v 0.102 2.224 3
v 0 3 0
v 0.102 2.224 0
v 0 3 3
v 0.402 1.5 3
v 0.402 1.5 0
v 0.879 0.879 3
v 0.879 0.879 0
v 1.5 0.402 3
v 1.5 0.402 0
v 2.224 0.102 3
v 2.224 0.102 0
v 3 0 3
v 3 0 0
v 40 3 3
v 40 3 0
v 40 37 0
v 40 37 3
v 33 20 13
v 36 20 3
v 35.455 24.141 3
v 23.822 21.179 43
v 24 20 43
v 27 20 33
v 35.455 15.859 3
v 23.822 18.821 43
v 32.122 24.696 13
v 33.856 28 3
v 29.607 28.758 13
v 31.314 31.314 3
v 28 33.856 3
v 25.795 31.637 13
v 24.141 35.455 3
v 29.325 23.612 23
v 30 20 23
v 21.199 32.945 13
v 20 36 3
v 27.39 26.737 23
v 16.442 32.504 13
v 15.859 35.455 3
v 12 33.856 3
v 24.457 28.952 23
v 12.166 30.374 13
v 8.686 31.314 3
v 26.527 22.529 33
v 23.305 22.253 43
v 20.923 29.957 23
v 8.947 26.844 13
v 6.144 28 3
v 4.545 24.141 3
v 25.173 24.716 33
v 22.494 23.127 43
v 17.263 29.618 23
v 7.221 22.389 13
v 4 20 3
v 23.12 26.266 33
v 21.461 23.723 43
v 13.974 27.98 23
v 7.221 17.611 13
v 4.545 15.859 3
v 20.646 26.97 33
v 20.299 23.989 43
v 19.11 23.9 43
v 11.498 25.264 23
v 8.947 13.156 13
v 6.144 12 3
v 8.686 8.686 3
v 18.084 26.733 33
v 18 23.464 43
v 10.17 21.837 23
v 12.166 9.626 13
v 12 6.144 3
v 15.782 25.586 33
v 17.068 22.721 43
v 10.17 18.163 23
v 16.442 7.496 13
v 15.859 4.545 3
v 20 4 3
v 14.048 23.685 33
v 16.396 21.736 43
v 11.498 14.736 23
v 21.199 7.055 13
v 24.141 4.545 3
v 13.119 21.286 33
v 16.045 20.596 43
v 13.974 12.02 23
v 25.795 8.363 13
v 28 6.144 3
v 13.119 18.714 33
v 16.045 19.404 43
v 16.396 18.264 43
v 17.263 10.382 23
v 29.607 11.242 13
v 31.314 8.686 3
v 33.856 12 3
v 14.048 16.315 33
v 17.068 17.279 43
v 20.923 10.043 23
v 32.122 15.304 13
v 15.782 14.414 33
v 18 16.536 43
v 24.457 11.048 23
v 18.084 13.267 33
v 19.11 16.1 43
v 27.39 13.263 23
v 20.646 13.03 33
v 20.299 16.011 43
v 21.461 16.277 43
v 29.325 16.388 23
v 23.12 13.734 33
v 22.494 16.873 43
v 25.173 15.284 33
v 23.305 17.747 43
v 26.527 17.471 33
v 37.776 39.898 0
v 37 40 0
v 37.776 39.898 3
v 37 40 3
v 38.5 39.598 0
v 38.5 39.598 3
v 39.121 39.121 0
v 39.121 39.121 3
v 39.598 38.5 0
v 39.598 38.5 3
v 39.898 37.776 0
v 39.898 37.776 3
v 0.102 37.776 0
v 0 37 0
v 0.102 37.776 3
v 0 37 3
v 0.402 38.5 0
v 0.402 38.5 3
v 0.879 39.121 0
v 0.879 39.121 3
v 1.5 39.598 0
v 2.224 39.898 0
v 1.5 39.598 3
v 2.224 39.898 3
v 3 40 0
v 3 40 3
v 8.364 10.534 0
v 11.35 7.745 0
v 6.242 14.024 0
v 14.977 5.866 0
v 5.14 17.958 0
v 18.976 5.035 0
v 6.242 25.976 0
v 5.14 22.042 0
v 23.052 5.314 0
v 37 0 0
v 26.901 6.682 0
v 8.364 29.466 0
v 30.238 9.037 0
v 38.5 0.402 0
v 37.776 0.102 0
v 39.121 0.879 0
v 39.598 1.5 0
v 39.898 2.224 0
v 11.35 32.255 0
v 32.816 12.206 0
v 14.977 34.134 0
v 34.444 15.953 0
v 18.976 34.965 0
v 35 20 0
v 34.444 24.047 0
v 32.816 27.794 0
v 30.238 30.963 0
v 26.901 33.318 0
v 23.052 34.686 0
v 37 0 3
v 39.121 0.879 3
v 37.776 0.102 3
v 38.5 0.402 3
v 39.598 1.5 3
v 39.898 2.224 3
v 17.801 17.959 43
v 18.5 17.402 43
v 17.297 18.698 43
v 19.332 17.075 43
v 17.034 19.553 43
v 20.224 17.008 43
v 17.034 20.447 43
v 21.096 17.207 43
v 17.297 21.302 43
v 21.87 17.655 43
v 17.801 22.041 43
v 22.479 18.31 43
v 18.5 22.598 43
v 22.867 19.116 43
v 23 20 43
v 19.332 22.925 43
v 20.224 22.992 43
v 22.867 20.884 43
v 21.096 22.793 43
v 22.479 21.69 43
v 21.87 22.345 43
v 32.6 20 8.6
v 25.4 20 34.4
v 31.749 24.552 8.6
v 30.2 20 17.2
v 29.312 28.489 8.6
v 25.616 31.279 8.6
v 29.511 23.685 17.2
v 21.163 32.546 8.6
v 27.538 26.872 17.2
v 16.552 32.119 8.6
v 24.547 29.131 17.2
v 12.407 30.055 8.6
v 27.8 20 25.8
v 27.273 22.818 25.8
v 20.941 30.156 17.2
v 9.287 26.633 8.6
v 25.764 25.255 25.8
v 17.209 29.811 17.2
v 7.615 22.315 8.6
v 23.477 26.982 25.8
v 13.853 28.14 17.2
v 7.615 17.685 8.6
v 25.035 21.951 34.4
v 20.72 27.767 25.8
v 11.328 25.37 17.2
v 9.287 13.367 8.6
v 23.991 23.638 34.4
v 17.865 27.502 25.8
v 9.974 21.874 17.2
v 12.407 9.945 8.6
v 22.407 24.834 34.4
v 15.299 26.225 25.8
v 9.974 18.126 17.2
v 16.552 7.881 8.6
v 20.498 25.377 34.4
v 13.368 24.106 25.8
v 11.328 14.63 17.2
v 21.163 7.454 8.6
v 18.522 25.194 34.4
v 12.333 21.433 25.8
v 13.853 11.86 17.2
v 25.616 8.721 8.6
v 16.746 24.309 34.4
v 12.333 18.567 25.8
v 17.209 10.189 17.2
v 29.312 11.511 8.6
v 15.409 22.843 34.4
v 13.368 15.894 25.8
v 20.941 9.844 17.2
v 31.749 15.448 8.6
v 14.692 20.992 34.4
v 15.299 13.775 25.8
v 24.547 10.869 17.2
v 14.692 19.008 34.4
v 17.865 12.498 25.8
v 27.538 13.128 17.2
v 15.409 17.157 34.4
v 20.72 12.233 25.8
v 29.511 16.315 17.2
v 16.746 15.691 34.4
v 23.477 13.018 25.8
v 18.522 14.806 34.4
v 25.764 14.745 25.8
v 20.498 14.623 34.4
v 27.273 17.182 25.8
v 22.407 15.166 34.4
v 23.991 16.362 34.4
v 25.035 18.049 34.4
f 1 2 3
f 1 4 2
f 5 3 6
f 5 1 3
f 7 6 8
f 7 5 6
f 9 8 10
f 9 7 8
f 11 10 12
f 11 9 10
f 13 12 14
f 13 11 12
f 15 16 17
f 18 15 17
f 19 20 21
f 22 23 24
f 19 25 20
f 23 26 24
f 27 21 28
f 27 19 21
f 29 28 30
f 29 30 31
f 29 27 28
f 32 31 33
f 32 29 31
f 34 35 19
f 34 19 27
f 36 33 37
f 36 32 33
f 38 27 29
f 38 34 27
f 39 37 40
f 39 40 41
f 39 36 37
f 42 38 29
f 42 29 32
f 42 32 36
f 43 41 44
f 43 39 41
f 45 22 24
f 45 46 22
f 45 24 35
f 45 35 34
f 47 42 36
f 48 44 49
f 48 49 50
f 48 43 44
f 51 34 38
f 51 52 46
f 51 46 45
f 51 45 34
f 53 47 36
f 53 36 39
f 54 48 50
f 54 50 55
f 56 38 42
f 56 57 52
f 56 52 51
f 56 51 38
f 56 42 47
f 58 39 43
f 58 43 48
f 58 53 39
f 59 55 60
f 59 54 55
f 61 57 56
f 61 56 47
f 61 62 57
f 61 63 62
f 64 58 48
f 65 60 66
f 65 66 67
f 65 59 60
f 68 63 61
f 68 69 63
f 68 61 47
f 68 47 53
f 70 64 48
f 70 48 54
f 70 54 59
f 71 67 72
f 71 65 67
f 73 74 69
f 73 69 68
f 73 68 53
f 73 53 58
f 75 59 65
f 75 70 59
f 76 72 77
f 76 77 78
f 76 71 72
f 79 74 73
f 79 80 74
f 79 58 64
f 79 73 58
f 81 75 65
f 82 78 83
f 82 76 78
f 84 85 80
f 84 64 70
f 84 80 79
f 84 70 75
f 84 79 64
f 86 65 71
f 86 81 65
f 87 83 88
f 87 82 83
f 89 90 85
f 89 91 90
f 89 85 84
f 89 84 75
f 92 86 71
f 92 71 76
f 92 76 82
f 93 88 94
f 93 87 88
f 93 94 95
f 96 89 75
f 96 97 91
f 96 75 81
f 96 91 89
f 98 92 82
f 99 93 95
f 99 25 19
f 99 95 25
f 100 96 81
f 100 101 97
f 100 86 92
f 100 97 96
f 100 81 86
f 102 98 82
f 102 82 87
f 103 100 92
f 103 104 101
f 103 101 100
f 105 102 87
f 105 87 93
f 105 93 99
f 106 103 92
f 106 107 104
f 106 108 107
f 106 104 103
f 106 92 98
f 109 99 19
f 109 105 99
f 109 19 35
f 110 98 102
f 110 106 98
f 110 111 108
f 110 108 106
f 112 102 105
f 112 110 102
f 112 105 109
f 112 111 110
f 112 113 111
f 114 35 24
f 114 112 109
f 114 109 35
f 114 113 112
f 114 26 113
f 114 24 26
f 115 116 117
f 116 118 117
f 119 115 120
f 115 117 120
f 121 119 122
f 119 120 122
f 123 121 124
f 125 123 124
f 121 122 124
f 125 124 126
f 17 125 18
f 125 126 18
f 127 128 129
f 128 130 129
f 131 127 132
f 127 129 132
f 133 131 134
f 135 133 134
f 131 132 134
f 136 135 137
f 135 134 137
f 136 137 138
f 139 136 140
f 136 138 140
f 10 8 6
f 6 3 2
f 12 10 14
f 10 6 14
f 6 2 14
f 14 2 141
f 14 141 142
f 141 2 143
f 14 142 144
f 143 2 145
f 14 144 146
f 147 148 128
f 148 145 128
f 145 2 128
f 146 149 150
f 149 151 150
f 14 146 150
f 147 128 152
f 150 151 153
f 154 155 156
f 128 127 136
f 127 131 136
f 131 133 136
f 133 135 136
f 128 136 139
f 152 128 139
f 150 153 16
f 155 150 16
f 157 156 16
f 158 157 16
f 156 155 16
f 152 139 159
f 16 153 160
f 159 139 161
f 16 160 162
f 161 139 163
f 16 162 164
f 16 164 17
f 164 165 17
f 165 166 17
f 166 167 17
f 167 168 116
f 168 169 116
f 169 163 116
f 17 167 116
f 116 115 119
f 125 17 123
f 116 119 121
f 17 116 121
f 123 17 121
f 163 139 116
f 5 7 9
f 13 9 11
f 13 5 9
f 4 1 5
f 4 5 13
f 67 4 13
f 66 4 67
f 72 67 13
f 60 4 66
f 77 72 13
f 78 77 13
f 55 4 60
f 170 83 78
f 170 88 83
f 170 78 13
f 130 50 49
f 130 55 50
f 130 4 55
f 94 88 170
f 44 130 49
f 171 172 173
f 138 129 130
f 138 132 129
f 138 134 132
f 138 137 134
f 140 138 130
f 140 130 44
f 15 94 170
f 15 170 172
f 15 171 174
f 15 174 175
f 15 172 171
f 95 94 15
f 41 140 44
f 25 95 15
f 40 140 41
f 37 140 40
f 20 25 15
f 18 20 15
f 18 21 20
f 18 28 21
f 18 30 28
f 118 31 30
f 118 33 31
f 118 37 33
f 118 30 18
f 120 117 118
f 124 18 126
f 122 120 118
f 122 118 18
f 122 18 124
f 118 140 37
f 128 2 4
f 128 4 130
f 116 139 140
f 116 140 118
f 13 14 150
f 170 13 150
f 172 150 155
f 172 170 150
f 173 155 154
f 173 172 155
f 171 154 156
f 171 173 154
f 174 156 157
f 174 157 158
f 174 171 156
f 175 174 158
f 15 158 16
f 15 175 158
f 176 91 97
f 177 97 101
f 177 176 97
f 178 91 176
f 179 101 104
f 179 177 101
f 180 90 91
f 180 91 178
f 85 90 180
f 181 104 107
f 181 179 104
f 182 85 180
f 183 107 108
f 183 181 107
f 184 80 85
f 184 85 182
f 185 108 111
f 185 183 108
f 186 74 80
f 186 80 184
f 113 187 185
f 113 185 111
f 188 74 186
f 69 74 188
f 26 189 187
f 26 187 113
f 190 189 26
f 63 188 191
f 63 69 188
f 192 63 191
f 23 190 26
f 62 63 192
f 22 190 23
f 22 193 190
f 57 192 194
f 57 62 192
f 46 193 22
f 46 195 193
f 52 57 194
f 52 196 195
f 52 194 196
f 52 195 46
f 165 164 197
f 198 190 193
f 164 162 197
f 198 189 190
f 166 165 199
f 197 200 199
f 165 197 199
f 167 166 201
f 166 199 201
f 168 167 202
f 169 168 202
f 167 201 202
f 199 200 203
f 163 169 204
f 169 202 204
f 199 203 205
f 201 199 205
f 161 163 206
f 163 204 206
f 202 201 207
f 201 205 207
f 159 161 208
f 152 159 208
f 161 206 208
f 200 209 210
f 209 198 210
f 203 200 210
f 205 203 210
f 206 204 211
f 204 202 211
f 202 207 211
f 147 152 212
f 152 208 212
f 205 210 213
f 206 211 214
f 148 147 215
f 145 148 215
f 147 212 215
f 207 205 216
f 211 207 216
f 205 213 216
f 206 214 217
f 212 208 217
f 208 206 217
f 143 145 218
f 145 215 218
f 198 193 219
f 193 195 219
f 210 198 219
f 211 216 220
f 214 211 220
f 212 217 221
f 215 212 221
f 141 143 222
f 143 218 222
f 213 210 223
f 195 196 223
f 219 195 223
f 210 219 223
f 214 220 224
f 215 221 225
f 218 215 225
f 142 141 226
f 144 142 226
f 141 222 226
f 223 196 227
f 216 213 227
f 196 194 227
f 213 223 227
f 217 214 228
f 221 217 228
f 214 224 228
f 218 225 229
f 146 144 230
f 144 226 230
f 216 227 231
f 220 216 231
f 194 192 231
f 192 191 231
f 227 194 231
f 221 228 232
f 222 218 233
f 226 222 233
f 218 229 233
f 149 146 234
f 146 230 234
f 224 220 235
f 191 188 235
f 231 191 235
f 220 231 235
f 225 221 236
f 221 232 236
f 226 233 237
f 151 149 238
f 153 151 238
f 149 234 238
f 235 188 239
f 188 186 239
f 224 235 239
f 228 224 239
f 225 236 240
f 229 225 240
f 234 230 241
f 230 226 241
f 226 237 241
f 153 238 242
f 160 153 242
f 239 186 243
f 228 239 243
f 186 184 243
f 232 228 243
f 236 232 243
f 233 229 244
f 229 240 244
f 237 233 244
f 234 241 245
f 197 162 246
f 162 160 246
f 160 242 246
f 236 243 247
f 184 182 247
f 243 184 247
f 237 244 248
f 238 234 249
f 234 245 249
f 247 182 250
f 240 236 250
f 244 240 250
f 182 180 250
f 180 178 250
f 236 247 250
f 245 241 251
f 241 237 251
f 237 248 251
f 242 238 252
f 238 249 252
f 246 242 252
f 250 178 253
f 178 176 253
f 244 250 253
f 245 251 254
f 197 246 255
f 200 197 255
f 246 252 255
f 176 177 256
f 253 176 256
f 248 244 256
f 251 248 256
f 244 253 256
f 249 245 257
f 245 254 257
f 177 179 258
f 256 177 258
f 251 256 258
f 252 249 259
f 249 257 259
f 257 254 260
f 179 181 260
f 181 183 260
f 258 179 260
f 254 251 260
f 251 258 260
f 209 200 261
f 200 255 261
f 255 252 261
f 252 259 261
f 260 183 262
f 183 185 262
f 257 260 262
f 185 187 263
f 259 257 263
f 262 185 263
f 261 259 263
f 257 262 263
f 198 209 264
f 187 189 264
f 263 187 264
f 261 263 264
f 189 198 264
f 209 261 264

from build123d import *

# Parameters (mm, degrees)
BOX_W     = 40
BOX_H     = 40
BOX_DEPTH = 3
FILLET_R  = 3


with BuildPart() as cono_interior:
    # Cone002 → Cone002 (revolve)
    with BuildSketch(Plane(origin=(20, 20, 0), x_dir=(1, 0, 0), z_dir=(0, -1, 0))):
        Polygon((0, 0), (15, 0), (3, 43), (0, 43), align=None)
    revolve(axis=Axis((20, 20, 0), (0, 0, 1)))


with BuildPart() as cono_ext:
    # Cone → Cone (revolve)
    with BuildSketch(Plane(origin=(20, 20, 3), x_dir=(1, 0, 0), z_dir=(0, -1, 0))):
        Polygon((0, 0), (16, 0), (4, 40), (0, 40), align=None)
    revolve(axis=Axis((20, 20, 3), (0, 0, 1)))


with BuildPart() as cono_redondeado:
    # Box → Box (new body)
    with BuildSketch(Plane.XY):
        with Locations((20, 20)):
            Rectangle(BOX_W, BOX_H)
    extrude(amount=BOX_DEPTH)

    # Fusion: union Cono_ext
    add(cono_ext.part)

    # Cut: cut Cono_interior
    add(cono_interior.part, mode=Mode.SUBTRACT)

    # Fillet
    fillet_edges = [cono_redondeado.edges().sort_by_distance(p)[0] for p in [
        (0, 0, 1.5),
        (0, 40, 1.5),
        (40, 0, 1.5),
        (40, 40, 1.5),
    ]]
    fillet(fillet_edges, radius=FILLET_R)


solid = cono_redondeado.part
